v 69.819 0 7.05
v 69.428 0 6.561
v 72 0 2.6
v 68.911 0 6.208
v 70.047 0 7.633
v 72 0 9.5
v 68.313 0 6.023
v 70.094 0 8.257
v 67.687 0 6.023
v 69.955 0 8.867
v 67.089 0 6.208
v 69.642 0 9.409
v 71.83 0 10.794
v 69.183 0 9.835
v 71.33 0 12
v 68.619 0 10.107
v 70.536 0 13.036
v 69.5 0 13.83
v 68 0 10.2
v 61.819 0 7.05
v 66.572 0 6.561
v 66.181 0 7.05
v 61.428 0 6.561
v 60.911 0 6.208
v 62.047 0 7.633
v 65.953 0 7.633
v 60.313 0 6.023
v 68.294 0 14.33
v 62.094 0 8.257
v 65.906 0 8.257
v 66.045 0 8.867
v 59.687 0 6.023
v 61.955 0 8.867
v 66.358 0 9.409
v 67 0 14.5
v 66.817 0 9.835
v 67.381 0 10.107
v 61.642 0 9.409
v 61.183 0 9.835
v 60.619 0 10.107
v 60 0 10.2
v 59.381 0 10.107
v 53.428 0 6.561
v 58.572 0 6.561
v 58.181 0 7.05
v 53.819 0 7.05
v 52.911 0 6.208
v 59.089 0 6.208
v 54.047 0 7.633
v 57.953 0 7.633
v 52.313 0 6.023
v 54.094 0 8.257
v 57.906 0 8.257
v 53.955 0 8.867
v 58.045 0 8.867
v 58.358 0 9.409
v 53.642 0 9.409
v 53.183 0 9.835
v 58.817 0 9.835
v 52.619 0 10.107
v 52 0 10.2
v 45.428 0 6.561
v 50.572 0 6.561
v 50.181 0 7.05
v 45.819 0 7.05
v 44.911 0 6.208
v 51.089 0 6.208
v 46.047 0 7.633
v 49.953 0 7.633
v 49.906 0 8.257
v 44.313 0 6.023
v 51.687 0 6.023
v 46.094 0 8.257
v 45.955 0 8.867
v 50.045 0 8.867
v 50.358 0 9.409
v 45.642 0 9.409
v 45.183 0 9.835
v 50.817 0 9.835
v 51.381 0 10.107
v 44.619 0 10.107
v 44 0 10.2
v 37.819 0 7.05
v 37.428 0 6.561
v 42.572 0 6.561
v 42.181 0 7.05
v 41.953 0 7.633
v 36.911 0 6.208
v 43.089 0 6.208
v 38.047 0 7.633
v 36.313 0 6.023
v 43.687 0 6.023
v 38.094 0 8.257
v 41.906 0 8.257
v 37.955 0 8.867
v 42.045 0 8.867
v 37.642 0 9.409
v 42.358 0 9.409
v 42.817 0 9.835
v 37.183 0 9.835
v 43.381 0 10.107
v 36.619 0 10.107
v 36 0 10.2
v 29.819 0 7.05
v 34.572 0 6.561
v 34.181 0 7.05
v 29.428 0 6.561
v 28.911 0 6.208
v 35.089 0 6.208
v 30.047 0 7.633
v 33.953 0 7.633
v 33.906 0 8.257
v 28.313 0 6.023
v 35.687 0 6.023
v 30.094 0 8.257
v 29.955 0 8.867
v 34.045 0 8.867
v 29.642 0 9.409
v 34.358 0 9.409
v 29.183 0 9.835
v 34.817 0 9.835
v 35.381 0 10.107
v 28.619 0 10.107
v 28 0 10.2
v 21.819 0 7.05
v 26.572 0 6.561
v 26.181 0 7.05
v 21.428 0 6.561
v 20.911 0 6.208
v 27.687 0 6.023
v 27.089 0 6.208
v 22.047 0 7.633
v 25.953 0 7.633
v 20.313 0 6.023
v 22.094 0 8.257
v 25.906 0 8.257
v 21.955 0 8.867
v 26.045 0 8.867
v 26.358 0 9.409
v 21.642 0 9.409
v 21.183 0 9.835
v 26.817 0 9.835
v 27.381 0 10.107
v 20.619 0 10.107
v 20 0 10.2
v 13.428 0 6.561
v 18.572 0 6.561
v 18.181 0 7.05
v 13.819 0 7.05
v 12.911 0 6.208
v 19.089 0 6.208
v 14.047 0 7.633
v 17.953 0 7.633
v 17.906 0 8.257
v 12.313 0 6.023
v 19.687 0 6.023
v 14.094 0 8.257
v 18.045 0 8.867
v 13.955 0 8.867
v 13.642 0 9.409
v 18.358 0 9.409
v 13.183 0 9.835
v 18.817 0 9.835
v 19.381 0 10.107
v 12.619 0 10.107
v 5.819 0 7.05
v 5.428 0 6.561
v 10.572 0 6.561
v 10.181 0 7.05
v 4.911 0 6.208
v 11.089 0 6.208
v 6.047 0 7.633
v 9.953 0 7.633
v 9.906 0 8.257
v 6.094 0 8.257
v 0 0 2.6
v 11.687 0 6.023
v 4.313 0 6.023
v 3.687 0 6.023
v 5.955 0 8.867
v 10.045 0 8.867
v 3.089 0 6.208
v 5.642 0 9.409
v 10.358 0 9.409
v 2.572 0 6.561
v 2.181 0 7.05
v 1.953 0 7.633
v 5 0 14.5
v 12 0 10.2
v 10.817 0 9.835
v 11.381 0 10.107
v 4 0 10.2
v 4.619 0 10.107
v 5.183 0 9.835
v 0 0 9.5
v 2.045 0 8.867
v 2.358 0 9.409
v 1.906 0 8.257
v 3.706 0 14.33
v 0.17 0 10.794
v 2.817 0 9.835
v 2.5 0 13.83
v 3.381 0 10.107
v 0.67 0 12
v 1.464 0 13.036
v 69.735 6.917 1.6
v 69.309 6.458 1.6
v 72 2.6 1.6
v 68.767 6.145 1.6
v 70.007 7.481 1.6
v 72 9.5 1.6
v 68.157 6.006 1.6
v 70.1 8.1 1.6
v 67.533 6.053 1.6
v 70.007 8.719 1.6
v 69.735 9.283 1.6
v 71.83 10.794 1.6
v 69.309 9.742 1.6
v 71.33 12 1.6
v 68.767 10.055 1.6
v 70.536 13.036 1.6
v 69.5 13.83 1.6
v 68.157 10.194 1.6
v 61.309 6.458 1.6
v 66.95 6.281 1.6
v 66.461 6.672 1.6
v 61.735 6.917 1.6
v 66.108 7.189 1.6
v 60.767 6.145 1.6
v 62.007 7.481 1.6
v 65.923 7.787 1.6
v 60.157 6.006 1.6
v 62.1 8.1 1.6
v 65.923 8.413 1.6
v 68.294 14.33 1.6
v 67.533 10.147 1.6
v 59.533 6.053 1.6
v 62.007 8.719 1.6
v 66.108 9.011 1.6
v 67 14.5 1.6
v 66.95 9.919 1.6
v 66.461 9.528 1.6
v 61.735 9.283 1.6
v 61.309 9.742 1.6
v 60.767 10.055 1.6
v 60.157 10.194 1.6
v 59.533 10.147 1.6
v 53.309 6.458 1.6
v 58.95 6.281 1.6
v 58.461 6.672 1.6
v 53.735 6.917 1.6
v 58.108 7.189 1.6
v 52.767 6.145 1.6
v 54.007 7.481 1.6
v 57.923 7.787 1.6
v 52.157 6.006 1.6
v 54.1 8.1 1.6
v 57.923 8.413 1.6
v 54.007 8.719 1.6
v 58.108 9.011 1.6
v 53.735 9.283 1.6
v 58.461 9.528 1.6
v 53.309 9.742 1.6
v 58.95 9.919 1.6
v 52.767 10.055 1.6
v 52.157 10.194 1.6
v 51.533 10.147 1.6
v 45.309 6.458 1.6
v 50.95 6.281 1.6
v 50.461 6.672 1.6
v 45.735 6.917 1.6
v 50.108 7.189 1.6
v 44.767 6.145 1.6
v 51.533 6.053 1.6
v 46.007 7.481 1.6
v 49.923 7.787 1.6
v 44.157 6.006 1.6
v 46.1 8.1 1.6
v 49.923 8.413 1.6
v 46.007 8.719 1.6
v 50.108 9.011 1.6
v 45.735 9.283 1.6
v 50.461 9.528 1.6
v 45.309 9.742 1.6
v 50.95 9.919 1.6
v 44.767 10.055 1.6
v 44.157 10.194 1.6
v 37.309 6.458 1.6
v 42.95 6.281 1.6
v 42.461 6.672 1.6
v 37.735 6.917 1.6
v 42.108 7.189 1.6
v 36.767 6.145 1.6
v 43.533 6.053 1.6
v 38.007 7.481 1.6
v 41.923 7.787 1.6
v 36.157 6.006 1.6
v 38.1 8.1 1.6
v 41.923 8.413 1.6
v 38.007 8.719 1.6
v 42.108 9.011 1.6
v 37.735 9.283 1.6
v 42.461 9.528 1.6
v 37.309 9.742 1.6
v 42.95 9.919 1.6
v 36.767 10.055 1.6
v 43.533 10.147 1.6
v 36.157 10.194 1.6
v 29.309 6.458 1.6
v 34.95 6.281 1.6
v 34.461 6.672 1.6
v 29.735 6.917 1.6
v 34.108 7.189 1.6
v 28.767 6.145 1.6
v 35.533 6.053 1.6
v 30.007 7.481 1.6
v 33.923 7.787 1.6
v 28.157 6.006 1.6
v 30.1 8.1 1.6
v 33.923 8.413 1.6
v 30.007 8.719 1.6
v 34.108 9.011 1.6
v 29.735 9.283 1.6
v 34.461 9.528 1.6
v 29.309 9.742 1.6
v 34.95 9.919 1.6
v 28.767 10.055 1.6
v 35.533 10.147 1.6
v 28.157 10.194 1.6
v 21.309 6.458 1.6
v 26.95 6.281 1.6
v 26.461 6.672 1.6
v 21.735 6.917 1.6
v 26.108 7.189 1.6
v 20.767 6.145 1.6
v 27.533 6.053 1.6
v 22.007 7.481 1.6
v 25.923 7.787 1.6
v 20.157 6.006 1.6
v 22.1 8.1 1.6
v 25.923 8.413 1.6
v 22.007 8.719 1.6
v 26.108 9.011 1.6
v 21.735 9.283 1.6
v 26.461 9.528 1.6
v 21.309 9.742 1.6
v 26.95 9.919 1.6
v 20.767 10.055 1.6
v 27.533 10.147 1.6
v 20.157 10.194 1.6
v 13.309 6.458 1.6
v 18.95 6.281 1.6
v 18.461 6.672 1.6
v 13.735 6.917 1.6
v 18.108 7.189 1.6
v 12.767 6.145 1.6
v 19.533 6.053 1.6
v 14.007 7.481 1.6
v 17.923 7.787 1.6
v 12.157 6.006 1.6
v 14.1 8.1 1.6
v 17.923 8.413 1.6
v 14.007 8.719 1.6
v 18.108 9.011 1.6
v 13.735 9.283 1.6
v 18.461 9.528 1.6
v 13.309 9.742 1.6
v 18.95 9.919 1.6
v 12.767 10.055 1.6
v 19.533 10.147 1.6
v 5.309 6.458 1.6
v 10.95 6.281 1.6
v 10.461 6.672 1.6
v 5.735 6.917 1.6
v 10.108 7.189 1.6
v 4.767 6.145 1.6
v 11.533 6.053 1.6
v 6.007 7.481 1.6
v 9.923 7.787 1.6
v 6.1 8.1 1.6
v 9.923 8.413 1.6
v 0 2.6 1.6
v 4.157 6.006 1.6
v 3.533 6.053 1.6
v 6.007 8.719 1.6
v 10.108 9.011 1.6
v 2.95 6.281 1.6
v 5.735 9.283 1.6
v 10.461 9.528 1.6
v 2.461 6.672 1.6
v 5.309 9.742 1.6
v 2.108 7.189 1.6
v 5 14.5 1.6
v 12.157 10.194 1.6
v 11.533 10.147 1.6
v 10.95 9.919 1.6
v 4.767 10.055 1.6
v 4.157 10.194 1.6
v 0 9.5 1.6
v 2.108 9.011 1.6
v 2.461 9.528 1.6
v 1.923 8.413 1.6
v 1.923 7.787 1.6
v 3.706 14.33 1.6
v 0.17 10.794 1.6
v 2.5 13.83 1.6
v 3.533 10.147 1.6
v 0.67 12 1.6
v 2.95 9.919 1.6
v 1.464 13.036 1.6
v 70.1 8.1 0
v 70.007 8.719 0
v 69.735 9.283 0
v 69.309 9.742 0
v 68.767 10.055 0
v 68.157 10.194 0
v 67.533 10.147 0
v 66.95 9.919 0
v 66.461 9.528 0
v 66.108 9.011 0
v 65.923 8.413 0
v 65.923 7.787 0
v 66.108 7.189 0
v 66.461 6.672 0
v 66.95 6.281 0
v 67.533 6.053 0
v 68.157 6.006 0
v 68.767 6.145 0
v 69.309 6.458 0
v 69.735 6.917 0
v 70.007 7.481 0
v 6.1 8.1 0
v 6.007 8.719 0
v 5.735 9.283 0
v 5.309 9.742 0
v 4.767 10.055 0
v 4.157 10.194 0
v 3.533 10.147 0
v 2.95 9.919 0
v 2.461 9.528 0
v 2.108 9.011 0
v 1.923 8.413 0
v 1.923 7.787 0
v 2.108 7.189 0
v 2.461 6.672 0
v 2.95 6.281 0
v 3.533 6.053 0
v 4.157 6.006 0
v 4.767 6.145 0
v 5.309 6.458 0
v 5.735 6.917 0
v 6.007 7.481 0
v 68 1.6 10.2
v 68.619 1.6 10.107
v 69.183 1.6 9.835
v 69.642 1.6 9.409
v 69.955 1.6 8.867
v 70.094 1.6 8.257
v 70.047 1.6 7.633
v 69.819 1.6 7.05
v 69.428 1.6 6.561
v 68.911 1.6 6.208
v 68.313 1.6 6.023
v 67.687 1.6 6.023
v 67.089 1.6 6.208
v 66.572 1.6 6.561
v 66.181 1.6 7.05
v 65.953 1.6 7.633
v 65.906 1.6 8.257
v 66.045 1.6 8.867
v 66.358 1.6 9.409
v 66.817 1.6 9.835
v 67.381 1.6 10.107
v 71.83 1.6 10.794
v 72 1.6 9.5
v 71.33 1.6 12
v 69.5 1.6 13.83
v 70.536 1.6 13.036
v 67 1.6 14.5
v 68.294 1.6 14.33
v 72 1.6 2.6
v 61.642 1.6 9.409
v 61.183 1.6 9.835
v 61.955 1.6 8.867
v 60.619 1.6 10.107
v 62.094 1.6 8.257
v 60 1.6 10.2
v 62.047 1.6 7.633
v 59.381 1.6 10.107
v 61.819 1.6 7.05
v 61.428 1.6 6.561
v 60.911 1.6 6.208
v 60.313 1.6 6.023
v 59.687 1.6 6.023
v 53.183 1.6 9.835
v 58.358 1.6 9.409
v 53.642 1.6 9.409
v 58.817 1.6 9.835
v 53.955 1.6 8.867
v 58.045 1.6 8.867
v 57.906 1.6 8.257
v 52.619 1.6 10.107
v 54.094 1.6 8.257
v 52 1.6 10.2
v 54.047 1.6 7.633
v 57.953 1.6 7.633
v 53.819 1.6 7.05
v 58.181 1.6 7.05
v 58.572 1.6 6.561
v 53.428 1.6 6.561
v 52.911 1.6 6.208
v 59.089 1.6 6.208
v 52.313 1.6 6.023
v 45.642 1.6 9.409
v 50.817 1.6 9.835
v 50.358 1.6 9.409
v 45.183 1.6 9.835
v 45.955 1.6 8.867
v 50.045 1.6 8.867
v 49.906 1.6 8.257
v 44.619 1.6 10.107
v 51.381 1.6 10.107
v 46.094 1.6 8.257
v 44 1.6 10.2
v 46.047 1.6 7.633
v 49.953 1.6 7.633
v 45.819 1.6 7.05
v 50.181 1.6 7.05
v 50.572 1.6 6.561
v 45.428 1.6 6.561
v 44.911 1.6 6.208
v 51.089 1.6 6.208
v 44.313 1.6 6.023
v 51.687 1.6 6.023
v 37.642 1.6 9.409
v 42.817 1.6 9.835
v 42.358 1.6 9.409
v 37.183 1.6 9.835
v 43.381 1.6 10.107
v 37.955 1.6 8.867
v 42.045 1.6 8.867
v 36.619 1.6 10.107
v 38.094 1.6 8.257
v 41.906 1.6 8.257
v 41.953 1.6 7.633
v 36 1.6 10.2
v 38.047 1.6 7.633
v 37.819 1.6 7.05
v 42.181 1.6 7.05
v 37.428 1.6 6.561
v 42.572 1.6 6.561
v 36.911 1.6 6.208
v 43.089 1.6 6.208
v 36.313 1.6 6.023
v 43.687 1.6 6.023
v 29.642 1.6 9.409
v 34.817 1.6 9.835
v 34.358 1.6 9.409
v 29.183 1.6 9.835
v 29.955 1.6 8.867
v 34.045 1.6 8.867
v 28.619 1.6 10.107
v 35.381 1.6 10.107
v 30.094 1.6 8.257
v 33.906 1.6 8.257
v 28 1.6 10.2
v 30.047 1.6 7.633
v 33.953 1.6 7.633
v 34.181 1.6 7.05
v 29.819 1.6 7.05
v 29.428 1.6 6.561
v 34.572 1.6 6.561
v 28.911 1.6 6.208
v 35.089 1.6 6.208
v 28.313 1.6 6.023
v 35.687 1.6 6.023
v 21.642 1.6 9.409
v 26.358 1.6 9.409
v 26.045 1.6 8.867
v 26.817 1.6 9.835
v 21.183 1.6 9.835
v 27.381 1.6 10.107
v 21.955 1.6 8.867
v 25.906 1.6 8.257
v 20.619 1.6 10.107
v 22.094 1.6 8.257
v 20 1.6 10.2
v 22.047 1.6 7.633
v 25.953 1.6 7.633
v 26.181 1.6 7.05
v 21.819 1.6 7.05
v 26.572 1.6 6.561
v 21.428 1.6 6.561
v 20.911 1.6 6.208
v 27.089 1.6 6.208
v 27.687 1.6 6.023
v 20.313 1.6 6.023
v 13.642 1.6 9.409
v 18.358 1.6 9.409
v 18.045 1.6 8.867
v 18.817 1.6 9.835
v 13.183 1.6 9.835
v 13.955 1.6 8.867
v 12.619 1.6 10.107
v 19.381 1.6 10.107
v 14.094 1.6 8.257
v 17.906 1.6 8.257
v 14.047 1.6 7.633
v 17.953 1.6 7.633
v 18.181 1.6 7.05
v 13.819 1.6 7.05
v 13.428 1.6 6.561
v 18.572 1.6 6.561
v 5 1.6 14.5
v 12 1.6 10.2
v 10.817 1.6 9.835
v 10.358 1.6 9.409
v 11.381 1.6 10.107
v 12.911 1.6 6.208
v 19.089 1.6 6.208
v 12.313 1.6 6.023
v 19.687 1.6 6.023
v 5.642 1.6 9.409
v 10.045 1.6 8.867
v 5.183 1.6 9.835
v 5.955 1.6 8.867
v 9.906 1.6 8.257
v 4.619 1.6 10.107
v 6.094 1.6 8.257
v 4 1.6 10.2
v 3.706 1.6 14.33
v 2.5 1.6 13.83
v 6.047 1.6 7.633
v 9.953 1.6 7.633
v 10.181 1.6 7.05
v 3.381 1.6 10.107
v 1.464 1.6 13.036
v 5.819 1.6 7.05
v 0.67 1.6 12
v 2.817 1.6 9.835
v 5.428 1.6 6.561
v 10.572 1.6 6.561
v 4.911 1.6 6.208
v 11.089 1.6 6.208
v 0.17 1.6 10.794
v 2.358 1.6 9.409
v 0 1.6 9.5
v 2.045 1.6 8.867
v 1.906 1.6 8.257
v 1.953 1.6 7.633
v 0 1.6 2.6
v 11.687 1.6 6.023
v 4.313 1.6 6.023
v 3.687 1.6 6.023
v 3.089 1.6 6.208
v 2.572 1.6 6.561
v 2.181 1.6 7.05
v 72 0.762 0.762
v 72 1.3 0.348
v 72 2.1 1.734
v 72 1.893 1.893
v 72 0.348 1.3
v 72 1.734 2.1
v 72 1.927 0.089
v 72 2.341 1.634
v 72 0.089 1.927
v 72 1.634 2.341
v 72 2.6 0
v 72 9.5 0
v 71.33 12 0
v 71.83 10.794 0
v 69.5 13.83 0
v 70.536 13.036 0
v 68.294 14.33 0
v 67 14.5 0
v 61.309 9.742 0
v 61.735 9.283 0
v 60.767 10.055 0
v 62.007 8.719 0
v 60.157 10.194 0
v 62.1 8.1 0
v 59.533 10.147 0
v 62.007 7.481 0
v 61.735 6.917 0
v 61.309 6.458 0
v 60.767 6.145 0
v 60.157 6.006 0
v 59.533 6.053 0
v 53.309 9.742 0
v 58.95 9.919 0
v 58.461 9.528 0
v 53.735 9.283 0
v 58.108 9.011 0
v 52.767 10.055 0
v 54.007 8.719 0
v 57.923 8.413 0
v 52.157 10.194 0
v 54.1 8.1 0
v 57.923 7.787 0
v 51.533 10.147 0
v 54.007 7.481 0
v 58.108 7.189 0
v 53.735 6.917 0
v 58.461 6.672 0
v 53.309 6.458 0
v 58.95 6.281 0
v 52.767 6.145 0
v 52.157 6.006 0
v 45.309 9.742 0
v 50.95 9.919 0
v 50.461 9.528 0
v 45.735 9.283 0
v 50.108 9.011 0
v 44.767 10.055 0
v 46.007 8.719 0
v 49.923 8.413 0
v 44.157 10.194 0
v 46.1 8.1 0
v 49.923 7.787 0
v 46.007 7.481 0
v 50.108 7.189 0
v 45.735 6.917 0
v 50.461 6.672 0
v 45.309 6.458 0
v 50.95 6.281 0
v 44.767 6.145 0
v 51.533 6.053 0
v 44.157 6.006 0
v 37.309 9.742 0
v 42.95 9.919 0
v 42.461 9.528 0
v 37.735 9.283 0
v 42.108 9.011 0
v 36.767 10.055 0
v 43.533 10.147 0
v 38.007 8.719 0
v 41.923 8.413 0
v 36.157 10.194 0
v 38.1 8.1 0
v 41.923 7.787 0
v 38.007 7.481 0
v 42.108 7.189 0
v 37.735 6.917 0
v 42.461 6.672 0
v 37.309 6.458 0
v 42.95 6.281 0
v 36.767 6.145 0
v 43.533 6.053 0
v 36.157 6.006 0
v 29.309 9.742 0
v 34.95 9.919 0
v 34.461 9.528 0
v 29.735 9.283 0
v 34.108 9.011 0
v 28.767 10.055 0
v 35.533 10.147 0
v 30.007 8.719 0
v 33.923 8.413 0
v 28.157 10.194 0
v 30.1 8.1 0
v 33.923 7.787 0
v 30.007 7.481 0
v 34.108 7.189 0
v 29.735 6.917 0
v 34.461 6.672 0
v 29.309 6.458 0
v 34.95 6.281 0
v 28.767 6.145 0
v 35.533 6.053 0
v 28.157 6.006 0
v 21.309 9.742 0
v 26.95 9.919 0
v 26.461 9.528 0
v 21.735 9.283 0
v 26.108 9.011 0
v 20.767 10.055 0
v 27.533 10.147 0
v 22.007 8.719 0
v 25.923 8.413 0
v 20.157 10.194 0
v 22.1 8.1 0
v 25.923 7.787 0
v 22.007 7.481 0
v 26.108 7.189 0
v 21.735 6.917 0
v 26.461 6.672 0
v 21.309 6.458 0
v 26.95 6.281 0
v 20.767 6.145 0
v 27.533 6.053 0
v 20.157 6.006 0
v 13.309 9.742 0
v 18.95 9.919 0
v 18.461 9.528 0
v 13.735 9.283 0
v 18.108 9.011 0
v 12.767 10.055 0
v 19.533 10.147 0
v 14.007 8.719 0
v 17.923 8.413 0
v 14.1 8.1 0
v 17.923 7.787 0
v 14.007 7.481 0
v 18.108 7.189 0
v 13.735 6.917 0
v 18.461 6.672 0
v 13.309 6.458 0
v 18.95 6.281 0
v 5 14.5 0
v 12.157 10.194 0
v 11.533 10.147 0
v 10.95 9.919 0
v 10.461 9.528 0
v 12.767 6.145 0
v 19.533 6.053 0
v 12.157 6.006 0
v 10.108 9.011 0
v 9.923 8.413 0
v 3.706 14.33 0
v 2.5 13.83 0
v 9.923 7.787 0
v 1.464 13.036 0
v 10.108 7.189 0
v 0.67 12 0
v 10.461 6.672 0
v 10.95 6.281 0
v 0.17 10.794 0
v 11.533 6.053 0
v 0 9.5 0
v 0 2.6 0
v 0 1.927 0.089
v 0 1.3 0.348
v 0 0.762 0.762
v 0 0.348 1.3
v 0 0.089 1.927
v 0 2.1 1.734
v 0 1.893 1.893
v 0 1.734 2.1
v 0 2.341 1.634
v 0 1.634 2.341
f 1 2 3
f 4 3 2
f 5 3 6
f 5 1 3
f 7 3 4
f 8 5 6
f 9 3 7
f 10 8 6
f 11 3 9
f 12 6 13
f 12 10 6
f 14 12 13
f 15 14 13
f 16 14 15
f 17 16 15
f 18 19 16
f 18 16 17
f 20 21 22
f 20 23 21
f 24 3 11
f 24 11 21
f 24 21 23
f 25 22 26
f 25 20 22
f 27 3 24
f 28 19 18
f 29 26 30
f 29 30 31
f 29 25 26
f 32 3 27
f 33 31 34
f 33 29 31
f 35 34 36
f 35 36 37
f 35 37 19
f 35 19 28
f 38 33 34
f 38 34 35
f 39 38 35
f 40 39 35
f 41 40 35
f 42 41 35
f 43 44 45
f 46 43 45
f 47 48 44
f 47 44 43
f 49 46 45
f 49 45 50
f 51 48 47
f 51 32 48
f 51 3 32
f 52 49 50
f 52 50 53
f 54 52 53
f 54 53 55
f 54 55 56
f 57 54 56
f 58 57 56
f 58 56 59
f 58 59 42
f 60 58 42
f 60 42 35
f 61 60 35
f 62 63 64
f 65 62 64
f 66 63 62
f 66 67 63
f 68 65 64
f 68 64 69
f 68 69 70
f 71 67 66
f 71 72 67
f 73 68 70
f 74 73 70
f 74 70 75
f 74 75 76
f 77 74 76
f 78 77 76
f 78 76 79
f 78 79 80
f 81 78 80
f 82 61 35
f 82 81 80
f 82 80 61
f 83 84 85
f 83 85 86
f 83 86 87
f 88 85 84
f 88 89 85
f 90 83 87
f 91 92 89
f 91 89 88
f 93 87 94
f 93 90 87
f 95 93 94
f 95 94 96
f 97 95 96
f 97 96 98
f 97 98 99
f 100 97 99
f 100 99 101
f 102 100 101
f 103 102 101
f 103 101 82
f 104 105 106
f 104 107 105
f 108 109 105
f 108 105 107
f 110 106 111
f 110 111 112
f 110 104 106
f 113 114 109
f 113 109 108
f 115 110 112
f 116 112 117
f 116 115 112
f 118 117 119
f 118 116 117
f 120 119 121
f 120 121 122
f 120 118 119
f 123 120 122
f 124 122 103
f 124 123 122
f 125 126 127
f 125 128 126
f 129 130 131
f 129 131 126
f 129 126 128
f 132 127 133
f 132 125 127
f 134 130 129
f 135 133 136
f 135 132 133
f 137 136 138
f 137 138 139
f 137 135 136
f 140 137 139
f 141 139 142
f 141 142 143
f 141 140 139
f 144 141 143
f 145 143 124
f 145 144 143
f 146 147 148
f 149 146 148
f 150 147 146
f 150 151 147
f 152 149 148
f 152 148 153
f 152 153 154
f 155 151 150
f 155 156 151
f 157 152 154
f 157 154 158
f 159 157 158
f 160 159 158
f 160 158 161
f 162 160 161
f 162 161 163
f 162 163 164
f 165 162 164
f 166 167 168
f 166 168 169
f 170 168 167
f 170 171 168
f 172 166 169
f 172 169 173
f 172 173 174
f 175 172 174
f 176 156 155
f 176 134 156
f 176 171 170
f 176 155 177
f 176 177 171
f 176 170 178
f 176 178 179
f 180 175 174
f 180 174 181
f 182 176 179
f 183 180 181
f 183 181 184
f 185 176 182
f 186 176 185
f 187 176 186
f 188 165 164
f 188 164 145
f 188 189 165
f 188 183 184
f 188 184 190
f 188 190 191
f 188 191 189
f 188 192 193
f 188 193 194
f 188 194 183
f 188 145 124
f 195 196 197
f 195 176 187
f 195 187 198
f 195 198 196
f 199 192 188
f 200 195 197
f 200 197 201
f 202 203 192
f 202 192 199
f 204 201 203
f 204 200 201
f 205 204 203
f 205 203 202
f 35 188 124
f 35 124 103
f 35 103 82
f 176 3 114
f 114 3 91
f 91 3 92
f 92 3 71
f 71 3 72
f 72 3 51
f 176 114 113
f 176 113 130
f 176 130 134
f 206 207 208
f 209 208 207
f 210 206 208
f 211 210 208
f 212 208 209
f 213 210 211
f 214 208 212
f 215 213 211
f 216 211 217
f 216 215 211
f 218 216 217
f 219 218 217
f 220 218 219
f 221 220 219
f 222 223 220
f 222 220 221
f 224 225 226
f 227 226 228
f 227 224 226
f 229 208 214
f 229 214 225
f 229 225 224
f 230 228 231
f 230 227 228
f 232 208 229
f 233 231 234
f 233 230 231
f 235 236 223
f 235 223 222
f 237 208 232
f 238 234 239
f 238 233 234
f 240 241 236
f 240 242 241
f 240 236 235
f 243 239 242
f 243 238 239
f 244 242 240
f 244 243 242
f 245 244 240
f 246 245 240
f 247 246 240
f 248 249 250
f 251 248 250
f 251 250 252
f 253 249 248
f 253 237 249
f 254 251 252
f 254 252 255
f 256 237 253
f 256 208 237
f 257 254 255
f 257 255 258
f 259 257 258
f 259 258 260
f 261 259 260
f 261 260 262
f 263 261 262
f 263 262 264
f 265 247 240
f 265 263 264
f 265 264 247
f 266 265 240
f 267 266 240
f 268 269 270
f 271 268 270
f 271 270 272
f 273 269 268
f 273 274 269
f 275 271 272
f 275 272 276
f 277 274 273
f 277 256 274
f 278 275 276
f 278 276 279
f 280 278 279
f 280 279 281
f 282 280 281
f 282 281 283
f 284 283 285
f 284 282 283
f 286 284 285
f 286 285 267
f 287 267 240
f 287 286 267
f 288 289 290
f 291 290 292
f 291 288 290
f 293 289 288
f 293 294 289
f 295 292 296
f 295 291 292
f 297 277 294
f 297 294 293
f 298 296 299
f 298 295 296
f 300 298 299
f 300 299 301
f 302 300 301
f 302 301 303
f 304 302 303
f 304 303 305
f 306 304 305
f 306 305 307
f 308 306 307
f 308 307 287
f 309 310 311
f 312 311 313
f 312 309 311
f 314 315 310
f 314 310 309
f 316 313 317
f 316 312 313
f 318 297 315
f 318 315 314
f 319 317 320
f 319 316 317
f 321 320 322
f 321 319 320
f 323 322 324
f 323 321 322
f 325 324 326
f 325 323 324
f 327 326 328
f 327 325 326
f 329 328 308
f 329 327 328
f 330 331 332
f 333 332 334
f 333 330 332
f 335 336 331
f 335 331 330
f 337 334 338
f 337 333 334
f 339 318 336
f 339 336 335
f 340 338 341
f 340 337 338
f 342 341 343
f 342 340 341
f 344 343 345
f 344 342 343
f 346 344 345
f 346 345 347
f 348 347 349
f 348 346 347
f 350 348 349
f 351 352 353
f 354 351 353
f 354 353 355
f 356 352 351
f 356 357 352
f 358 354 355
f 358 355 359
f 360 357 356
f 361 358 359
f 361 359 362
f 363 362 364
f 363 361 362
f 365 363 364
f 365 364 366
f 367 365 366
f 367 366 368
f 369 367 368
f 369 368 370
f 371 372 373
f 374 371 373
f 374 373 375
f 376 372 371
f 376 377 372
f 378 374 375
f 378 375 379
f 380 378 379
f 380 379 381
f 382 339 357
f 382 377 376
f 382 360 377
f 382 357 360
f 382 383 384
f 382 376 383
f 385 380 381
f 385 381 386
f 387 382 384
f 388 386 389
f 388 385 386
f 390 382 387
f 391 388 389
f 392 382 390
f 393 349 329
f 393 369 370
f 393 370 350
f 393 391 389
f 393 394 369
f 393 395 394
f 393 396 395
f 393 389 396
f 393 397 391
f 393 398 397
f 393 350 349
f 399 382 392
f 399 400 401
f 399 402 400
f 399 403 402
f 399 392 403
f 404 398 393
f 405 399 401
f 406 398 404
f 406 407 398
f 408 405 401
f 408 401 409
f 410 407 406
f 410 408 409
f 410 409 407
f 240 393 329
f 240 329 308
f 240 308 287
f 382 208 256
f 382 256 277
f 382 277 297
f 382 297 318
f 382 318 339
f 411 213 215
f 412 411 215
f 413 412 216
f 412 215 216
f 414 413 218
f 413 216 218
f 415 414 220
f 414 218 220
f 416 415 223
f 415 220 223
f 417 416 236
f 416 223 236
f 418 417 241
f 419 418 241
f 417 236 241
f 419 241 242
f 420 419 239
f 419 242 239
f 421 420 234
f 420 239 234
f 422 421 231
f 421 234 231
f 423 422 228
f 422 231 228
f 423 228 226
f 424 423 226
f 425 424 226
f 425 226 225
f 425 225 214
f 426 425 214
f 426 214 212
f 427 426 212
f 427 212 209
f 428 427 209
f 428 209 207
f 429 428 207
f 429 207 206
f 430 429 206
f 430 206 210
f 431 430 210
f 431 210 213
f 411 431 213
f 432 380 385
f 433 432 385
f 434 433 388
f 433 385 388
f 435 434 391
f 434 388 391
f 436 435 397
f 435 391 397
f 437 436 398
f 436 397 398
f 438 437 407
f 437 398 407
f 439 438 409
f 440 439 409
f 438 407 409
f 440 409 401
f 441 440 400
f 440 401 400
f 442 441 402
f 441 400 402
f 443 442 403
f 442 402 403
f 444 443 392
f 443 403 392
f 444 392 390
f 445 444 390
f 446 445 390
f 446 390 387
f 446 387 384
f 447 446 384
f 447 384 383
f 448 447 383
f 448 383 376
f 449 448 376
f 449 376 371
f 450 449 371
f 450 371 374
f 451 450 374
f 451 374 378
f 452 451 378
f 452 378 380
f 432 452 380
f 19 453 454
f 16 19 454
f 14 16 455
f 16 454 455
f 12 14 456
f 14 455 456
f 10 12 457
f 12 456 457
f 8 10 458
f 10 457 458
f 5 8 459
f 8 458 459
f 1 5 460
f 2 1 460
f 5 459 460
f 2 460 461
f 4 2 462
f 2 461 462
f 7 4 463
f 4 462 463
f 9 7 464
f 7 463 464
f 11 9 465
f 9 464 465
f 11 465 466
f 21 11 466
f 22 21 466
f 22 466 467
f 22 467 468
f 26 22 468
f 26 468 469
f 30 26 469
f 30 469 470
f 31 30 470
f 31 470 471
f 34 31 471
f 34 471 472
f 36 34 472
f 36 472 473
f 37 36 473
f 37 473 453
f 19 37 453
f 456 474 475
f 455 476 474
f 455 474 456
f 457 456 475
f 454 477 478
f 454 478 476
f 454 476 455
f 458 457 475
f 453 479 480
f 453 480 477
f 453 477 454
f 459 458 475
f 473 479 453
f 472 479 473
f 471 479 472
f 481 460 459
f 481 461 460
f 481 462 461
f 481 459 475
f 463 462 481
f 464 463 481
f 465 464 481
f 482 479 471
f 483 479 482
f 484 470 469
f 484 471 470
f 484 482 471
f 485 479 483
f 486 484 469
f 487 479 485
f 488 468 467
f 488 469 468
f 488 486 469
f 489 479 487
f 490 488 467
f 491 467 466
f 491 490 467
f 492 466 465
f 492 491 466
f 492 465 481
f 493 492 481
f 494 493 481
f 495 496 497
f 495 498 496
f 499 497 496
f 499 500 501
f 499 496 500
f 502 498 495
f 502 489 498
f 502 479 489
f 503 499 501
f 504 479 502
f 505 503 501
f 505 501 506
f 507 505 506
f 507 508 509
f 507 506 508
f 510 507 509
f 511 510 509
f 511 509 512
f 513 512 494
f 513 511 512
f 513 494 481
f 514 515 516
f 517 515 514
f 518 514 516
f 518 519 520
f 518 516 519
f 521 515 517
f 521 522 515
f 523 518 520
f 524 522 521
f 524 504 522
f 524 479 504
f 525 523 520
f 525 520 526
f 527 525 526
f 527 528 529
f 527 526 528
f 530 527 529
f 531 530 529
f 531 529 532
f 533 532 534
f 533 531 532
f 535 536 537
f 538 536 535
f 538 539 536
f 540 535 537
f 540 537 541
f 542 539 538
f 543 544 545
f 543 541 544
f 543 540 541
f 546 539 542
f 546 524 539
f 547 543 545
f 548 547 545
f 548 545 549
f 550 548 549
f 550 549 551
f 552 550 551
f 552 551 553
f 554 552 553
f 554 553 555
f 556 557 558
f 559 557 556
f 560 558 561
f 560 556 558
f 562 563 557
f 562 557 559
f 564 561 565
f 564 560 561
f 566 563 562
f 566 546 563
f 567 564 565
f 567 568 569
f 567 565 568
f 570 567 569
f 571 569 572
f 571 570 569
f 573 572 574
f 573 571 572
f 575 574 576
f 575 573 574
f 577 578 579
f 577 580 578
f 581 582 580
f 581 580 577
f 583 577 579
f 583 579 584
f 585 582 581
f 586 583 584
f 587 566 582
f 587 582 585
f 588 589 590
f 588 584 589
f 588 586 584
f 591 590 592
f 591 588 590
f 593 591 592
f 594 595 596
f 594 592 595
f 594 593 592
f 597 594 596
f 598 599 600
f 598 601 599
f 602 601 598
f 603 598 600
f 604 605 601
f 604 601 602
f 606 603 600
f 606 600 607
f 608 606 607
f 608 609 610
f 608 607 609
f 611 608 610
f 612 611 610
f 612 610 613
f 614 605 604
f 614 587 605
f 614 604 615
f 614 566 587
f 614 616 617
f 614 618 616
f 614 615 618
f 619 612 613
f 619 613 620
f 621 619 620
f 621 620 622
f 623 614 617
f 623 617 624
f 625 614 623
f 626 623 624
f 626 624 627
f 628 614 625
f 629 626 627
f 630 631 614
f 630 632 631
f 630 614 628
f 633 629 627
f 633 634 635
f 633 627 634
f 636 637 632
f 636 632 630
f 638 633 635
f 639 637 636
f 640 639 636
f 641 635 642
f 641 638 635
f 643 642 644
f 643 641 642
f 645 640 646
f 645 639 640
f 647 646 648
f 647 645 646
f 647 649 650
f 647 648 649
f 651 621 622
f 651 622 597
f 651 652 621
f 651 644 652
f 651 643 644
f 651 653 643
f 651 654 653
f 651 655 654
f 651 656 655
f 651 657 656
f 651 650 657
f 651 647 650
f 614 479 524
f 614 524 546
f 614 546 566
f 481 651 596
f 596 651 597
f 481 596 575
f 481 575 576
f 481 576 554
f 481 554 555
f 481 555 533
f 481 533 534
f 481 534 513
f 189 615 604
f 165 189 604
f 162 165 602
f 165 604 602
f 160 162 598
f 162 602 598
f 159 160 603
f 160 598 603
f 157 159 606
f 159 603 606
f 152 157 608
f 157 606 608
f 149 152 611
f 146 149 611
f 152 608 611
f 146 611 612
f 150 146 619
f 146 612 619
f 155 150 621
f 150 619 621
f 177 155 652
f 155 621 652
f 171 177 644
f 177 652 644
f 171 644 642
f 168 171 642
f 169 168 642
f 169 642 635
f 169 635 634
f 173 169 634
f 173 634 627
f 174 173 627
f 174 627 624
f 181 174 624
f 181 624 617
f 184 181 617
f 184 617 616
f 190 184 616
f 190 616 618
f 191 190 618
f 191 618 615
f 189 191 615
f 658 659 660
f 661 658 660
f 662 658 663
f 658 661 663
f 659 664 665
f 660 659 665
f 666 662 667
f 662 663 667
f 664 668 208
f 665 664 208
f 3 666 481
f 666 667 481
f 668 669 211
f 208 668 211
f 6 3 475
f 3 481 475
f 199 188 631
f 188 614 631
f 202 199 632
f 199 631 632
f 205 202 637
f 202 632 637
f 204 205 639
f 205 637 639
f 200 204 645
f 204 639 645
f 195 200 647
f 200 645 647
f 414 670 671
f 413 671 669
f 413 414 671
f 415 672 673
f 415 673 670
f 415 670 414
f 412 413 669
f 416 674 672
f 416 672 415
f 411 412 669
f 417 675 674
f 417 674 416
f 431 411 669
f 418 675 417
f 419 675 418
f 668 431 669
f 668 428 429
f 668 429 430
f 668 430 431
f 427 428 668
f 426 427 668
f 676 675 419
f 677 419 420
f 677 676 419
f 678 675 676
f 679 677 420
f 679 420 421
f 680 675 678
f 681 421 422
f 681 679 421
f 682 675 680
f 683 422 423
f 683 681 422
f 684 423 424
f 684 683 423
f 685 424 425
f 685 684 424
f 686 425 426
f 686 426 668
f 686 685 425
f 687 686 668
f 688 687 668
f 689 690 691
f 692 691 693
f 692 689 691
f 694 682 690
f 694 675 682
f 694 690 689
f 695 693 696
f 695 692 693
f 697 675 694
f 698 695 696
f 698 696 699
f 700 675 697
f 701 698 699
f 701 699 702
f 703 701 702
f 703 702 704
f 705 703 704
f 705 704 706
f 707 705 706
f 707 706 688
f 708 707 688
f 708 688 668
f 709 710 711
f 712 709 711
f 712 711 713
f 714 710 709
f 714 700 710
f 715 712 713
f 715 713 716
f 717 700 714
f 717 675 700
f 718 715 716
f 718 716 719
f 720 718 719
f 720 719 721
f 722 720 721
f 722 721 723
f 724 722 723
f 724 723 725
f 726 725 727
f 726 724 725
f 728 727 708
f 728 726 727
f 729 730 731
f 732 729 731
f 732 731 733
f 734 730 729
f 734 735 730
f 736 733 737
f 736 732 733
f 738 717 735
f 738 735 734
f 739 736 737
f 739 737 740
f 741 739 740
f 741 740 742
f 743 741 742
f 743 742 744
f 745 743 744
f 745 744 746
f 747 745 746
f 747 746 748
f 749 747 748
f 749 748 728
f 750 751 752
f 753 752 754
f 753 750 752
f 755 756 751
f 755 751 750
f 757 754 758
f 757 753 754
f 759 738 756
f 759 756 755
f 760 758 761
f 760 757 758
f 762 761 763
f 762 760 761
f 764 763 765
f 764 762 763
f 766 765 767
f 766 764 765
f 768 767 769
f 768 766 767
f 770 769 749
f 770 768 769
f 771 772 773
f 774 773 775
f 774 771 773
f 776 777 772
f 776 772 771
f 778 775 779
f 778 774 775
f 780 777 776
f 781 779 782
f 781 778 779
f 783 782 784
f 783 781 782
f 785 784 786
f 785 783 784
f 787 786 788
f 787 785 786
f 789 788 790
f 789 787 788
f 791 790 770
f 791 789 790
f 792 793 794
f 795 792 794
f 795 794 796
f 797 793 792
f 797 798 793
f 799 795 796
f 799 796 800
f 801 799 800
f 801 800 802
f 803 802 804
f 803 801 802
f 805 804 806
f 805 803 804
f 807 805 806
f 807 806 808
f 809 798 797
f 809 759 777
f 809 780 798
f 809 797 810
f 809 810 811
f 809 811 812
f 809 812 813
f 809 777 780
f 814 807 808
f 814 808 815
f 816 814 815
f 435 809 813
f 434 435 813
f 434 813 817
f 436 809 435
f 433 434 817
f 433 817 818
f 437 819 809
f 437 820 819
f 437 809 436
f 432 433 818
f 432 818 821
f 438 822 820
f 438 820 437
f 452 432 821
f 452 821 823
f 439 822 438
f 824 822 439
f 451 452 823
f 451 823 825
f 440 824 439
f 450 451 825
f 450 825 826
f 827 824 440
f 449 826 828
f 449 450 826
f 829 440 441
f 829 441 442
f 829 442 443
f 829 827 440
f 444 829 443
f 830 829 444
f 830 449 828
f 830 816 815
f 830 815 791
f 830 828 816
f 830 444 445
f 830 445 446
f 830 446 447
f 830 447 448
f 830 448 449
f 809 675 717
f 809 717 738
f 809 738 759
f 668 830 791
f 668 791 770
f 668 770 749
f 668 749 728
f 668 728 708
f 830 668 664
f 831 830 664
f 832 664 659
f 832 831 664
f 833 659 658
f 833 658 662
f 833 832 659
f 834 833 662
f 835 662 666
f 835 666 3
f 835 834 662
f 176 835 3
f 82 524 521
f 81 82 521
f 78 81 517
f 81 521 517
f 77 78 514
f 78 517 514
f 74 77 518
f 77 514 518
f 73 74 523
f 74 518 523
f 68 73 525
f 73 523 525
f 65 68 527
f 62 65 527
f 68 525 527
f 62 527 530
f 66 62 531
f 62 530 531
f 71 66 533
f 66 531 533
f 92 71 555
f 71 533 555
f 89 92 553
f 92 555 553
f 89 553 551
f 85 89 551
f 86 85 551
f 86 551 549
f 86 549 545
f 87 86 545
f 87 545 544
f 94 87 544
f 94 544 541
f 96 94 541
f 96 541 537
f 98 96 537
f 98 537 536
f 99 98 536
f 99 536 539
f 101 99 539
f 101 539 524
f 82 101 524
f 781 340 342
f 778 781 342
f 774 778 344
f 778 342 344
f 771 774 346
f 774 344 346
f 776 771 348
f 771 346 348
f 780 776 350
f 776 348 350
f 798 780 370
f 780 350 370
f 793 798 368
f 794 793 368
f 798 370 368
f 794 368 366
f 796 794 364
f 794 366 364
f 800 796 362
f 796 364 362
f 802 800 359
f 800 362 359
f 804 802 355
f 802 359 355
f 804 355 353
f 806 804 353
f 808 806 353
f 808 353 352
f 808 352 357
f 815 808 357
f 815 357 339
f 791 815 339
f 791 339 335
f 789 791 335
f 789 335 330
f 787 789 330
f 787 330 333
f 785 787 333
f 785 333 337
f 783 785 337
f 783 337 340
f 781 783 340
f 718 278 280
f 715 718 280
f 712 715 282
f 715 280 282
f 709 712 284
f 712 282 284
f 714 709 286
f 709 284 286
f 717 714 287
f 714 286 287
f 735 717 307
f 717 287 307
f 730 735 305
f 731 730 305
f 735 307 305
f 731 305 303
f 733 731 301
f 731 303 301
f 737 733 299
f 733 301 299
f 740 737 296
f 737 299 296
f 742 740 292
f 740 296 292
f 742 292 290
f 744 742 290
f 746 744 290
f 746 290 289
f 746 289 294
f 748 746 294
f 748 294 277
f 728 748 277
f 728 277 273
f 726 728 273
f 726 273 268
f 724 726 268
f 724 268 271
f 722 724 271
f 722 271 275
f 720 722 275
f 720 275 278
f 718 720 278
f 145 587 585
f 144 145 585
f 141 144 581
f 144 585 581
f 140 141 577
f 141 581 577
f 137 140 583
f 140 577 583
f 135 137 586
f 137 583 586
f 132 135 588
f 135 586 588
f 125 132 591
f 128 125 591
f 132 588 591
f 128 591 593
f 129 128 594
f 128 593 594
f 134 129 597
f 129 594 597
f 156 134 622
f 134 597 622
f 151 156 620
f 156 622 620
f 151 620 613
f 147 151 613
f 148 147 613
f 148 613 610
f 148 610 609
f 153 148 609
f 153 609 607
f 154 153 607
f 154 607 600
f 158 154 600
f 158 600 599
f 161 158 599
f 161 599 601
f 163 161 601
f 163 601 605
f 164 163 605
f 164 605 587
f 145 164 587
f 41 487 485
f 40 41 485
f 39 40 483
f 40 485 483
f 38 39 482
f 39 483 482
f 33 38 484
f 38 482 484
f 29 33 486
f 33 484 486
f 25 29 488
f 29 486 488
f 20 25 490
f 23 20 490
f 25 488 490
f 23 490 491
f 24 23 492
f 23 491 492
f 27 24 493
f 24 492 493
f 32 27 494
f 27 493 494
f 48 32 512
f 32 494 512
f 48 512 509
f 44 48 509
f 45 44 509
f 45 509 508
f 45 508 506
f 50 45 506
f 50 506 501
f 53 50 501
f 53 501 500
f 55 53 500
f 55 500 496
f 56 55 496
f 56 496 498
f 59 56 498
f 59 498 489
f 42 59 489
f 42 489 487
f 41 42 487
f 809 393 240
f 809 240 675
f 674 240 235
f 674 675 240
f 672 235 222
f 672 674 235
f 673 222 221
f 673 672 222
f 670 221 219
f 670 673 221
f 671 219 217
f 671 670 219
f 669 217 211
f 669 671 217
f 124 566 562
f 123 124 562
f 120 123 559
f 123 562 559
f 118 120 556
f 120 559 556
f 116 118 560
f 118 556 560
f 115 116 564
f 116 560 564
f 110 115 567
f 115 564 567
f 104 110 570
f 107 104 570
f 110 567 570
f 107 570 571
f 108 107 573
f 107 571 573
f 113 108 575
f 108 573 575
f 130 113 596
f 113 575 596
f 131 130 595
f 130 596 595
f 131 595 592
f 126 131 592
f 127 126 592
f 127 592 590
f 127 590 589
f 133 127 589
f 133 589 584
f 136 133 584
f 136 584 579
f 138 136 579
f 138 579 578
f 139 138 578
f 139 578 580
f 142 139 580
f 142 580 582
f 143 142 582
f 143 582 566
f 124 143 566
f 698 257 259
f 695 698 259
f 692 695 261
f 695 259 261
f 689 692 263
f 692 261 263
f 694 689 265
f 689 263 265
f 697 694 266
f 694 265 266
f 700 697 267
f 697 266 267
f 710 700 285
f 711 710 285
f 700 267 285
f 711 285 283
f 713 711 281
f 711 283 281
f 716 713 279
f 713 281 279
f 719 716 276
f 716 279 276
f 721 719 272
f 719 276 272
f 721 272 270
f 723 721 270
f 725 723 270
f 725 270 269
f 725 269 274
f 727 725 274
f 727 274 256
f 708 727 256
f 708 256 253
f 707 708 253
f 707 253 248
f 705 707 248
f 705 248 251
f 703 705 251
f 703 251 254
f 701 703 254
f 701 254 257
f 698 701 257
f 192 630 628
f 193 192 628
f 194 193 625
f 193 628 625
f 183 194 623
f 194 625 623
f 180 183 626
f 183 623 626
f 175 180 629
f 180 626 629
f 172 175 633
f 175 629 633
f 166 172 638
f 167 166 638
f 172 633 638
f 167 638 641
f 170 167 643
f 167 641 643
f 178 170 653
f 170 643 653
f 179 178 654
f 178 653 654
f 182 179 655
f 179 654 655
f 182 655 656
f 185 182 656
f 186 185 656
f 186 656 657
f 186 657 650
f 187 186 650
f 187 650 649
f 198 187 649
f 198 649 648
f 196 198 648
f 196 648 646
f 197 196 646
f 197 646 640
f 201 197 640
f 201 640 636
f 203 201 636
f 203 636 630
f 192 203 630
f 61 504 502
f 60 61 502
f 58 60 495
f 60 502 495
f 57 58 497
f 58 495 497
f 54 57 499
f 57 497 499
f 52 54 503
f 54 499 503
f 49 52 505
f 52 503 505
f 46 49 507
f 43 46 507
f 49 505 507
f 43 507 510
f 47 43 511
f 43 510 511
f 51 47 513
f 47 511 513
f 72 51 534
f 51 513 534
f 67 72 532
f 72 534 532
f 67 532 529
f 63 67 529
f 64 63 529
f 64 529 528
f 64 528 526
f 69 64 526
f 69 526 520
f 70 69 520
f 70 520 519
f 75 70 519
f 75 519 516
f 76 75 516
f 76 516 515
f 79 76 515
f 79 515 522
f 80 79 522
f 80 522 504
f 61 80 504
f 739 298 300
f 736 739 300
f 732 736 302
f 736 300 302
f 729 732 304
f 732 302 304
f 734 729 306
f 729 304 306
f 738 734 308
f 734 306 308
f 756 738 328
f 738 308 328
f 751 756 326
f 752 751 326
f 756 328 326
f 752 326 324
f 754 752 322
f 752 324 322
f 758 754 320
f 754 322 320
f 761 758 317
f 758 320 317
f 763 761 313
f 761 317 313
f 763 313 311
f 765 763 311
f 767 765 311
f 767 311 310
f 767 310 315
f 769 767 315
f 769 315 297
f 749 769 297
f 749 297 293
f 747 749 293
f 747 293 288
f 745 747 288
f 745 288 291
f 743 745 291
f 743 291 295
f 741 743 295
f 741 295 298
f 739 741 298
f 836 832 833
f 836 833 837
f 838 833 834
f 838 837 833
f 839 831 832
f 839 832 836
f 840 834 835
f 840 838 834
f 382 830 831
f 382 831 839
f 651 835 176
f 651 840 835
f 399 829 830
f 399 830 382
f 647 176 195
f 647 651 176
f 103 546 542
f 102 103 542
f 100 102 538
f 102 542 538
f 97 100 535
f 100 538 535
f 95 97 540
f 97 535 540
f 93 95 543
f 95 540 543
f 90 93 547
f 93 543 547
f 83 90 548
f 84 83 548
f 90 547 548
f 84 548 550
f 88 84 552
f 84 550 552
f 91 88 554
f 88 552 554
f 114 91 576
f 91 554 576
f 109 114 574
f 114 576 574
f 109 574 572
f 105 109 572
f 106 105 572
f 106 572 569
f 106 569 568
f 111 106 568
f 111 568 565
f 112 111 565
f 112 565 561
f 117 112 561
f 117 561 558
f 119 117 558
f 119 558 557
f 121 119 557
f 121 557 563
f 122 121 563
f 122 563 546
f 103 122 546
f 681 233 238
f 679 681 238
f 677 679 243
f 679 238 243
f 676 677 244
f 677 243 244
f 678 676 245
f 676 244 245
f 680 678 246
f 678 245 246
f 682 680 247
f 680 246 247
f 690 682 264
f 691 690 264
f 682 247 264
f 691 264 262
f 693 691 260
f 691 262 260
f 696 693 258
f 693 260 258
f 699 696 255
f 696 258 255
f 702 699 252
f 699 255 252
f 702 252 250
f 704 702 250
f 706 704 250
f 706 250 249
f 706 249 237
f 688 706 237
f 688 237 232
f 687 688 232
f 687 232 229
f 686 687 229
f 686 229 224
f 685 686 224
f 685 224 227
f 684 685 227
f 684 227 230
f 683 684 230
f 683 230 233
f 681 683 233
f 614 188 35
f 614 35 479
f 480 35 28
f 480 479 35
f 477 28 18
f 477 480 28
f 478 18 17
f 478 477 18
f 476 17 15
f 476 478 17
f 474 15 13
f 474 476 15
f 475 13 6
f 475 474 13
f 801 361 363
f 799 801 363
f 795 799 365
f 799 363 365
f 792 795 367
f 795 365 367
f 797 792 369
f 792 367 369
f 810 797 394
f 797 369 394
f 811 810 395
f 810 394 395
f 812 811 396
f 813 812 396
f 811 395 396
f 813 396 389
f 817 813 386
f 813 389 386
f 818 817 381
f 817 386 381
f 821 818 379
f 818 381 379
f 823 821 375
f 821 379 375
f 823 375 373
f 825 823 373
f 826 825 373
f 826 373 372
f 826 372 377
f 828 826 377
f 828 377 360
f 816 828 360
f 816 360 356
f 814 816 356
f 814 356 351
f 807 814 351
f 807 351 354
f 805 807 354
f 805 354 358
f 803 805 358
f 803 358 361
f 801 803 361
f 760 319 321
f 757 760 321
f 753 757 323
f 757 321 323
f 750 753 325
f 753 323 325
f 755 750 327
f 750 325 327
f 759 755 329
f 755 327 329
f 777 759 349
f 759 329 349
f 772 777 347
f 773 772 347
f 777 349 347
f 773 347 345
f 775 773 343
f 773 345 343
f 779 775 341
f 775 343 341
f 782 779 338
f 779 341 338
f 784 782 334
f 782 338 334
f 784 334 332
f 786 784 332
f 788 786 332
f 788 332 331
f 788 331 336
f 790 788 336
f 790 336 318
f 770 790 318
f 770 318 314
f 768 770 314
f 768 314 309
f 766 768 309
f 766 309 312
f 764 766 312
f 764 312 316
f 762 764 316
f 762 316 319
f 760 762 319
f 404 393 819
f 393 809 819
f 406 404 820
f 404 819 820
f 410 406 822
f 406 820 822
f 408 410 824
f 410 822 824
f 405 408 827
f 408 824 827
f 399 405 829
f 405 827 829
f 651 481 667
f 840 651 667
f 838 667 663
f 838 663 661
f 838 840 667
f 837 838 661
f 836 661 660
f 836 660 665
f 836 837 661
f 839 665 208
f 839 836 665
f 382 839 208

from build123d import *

# Parameters (mm, degrees)
BASE_FLANGE1_DEPTH = 72
FILLET1_R          = 5
SKETCH6_R          = 2.1
CUT_EXTRUDE1_DEPTH = 75.569833043
SKETCH7_R          = 2.1
CUT_EXTRUDE2_DEPTH = 75.569833043
LPATTERN1_COUNT    = 9
LPATTERN1_PITCH    = 8


# Sheet-metal steps are written as plain solids
with BuildPart() as part:
    # Sketch1 → Base-Flange1 (new body)
    with BuildSketch(Plane(origin=(0, 0, 0), x_dir=(0, 0, -1), z_dir=(1, 0, 0))):
        with BuildLine():
            Line((0, 14.5), (0, 2.6))
            ThreePointArc((0, 2.6), (-0.761522369, 0.761522369), (-2.6, 0))
            Line((-2.6, 0), (-14.5, 0))
            Line((-14.5, 0), (-14.5, 1.6))
            Line((-14.5, 1.6), (-2.6, 1.6))
            ThreePointArc((-2.6, 1.6), (-1.892893219, 1.892893219), (-1.6, 2.6))
            Line((-1.6, 2.6), (-1.6, 14.5))
            Line((-1.6, 14.5), (0, 14.5))
        make_face()
    extrude(amount=BASE_FLANGE1_DEPTH)

    # Fillet1
    fillet1_edges = [part.edges().sort_by_distance(p)[0] for p in [
        (72, 14.5, 0.8),
        (72, 0.8, 14.5),
        (0, 14.5, 0.8),
        (0, 0.8, 14.5),
    ]]
    fillet(fillet1_edges, radius=FILLET1_R)

    # Sketch6 → Cut-Extrude1 (cut, through all)
    with BuildSketch(Plane.XY.offset(1.6)):
        with Locations((4, 8.1)):
            Circle(SKETCH6_R)
    cut_extrude1 = extrude(amount=-CUT_EXTRUDE1_DEPTH, mode=Mode.SUBTRACT)

    # Sketch7 → Cut-Extrude2 (cut, through all)
    with BuildSketch(Plane(origin=(0, 1.6, 0), x_dir=(1, 0, 0), z_dir=(0, 1, 0))):
        with Locations(Location((4, -8.1, 0), (0, 0, 270))):
            Circle(SKETCH7_R)
    cut_extrude2 = extrude(amount=-CUT_EXTRUDE2_DEPTH, mode=Mode.SUBTRACT)

    # LPattern1: Cut-Extrude1, Cut-Extrude2 ×9
    with Locations(*[(i * LPATTERN1_PITCH, 0, 0) for i in range(1, LPATTERN1_COUNT)]):
        add(cut_extrude1, mode=Mode.SUBTRACT)
        add(cut_extrude2, mode=Mode.SUBTRACT)


solid = part.part
